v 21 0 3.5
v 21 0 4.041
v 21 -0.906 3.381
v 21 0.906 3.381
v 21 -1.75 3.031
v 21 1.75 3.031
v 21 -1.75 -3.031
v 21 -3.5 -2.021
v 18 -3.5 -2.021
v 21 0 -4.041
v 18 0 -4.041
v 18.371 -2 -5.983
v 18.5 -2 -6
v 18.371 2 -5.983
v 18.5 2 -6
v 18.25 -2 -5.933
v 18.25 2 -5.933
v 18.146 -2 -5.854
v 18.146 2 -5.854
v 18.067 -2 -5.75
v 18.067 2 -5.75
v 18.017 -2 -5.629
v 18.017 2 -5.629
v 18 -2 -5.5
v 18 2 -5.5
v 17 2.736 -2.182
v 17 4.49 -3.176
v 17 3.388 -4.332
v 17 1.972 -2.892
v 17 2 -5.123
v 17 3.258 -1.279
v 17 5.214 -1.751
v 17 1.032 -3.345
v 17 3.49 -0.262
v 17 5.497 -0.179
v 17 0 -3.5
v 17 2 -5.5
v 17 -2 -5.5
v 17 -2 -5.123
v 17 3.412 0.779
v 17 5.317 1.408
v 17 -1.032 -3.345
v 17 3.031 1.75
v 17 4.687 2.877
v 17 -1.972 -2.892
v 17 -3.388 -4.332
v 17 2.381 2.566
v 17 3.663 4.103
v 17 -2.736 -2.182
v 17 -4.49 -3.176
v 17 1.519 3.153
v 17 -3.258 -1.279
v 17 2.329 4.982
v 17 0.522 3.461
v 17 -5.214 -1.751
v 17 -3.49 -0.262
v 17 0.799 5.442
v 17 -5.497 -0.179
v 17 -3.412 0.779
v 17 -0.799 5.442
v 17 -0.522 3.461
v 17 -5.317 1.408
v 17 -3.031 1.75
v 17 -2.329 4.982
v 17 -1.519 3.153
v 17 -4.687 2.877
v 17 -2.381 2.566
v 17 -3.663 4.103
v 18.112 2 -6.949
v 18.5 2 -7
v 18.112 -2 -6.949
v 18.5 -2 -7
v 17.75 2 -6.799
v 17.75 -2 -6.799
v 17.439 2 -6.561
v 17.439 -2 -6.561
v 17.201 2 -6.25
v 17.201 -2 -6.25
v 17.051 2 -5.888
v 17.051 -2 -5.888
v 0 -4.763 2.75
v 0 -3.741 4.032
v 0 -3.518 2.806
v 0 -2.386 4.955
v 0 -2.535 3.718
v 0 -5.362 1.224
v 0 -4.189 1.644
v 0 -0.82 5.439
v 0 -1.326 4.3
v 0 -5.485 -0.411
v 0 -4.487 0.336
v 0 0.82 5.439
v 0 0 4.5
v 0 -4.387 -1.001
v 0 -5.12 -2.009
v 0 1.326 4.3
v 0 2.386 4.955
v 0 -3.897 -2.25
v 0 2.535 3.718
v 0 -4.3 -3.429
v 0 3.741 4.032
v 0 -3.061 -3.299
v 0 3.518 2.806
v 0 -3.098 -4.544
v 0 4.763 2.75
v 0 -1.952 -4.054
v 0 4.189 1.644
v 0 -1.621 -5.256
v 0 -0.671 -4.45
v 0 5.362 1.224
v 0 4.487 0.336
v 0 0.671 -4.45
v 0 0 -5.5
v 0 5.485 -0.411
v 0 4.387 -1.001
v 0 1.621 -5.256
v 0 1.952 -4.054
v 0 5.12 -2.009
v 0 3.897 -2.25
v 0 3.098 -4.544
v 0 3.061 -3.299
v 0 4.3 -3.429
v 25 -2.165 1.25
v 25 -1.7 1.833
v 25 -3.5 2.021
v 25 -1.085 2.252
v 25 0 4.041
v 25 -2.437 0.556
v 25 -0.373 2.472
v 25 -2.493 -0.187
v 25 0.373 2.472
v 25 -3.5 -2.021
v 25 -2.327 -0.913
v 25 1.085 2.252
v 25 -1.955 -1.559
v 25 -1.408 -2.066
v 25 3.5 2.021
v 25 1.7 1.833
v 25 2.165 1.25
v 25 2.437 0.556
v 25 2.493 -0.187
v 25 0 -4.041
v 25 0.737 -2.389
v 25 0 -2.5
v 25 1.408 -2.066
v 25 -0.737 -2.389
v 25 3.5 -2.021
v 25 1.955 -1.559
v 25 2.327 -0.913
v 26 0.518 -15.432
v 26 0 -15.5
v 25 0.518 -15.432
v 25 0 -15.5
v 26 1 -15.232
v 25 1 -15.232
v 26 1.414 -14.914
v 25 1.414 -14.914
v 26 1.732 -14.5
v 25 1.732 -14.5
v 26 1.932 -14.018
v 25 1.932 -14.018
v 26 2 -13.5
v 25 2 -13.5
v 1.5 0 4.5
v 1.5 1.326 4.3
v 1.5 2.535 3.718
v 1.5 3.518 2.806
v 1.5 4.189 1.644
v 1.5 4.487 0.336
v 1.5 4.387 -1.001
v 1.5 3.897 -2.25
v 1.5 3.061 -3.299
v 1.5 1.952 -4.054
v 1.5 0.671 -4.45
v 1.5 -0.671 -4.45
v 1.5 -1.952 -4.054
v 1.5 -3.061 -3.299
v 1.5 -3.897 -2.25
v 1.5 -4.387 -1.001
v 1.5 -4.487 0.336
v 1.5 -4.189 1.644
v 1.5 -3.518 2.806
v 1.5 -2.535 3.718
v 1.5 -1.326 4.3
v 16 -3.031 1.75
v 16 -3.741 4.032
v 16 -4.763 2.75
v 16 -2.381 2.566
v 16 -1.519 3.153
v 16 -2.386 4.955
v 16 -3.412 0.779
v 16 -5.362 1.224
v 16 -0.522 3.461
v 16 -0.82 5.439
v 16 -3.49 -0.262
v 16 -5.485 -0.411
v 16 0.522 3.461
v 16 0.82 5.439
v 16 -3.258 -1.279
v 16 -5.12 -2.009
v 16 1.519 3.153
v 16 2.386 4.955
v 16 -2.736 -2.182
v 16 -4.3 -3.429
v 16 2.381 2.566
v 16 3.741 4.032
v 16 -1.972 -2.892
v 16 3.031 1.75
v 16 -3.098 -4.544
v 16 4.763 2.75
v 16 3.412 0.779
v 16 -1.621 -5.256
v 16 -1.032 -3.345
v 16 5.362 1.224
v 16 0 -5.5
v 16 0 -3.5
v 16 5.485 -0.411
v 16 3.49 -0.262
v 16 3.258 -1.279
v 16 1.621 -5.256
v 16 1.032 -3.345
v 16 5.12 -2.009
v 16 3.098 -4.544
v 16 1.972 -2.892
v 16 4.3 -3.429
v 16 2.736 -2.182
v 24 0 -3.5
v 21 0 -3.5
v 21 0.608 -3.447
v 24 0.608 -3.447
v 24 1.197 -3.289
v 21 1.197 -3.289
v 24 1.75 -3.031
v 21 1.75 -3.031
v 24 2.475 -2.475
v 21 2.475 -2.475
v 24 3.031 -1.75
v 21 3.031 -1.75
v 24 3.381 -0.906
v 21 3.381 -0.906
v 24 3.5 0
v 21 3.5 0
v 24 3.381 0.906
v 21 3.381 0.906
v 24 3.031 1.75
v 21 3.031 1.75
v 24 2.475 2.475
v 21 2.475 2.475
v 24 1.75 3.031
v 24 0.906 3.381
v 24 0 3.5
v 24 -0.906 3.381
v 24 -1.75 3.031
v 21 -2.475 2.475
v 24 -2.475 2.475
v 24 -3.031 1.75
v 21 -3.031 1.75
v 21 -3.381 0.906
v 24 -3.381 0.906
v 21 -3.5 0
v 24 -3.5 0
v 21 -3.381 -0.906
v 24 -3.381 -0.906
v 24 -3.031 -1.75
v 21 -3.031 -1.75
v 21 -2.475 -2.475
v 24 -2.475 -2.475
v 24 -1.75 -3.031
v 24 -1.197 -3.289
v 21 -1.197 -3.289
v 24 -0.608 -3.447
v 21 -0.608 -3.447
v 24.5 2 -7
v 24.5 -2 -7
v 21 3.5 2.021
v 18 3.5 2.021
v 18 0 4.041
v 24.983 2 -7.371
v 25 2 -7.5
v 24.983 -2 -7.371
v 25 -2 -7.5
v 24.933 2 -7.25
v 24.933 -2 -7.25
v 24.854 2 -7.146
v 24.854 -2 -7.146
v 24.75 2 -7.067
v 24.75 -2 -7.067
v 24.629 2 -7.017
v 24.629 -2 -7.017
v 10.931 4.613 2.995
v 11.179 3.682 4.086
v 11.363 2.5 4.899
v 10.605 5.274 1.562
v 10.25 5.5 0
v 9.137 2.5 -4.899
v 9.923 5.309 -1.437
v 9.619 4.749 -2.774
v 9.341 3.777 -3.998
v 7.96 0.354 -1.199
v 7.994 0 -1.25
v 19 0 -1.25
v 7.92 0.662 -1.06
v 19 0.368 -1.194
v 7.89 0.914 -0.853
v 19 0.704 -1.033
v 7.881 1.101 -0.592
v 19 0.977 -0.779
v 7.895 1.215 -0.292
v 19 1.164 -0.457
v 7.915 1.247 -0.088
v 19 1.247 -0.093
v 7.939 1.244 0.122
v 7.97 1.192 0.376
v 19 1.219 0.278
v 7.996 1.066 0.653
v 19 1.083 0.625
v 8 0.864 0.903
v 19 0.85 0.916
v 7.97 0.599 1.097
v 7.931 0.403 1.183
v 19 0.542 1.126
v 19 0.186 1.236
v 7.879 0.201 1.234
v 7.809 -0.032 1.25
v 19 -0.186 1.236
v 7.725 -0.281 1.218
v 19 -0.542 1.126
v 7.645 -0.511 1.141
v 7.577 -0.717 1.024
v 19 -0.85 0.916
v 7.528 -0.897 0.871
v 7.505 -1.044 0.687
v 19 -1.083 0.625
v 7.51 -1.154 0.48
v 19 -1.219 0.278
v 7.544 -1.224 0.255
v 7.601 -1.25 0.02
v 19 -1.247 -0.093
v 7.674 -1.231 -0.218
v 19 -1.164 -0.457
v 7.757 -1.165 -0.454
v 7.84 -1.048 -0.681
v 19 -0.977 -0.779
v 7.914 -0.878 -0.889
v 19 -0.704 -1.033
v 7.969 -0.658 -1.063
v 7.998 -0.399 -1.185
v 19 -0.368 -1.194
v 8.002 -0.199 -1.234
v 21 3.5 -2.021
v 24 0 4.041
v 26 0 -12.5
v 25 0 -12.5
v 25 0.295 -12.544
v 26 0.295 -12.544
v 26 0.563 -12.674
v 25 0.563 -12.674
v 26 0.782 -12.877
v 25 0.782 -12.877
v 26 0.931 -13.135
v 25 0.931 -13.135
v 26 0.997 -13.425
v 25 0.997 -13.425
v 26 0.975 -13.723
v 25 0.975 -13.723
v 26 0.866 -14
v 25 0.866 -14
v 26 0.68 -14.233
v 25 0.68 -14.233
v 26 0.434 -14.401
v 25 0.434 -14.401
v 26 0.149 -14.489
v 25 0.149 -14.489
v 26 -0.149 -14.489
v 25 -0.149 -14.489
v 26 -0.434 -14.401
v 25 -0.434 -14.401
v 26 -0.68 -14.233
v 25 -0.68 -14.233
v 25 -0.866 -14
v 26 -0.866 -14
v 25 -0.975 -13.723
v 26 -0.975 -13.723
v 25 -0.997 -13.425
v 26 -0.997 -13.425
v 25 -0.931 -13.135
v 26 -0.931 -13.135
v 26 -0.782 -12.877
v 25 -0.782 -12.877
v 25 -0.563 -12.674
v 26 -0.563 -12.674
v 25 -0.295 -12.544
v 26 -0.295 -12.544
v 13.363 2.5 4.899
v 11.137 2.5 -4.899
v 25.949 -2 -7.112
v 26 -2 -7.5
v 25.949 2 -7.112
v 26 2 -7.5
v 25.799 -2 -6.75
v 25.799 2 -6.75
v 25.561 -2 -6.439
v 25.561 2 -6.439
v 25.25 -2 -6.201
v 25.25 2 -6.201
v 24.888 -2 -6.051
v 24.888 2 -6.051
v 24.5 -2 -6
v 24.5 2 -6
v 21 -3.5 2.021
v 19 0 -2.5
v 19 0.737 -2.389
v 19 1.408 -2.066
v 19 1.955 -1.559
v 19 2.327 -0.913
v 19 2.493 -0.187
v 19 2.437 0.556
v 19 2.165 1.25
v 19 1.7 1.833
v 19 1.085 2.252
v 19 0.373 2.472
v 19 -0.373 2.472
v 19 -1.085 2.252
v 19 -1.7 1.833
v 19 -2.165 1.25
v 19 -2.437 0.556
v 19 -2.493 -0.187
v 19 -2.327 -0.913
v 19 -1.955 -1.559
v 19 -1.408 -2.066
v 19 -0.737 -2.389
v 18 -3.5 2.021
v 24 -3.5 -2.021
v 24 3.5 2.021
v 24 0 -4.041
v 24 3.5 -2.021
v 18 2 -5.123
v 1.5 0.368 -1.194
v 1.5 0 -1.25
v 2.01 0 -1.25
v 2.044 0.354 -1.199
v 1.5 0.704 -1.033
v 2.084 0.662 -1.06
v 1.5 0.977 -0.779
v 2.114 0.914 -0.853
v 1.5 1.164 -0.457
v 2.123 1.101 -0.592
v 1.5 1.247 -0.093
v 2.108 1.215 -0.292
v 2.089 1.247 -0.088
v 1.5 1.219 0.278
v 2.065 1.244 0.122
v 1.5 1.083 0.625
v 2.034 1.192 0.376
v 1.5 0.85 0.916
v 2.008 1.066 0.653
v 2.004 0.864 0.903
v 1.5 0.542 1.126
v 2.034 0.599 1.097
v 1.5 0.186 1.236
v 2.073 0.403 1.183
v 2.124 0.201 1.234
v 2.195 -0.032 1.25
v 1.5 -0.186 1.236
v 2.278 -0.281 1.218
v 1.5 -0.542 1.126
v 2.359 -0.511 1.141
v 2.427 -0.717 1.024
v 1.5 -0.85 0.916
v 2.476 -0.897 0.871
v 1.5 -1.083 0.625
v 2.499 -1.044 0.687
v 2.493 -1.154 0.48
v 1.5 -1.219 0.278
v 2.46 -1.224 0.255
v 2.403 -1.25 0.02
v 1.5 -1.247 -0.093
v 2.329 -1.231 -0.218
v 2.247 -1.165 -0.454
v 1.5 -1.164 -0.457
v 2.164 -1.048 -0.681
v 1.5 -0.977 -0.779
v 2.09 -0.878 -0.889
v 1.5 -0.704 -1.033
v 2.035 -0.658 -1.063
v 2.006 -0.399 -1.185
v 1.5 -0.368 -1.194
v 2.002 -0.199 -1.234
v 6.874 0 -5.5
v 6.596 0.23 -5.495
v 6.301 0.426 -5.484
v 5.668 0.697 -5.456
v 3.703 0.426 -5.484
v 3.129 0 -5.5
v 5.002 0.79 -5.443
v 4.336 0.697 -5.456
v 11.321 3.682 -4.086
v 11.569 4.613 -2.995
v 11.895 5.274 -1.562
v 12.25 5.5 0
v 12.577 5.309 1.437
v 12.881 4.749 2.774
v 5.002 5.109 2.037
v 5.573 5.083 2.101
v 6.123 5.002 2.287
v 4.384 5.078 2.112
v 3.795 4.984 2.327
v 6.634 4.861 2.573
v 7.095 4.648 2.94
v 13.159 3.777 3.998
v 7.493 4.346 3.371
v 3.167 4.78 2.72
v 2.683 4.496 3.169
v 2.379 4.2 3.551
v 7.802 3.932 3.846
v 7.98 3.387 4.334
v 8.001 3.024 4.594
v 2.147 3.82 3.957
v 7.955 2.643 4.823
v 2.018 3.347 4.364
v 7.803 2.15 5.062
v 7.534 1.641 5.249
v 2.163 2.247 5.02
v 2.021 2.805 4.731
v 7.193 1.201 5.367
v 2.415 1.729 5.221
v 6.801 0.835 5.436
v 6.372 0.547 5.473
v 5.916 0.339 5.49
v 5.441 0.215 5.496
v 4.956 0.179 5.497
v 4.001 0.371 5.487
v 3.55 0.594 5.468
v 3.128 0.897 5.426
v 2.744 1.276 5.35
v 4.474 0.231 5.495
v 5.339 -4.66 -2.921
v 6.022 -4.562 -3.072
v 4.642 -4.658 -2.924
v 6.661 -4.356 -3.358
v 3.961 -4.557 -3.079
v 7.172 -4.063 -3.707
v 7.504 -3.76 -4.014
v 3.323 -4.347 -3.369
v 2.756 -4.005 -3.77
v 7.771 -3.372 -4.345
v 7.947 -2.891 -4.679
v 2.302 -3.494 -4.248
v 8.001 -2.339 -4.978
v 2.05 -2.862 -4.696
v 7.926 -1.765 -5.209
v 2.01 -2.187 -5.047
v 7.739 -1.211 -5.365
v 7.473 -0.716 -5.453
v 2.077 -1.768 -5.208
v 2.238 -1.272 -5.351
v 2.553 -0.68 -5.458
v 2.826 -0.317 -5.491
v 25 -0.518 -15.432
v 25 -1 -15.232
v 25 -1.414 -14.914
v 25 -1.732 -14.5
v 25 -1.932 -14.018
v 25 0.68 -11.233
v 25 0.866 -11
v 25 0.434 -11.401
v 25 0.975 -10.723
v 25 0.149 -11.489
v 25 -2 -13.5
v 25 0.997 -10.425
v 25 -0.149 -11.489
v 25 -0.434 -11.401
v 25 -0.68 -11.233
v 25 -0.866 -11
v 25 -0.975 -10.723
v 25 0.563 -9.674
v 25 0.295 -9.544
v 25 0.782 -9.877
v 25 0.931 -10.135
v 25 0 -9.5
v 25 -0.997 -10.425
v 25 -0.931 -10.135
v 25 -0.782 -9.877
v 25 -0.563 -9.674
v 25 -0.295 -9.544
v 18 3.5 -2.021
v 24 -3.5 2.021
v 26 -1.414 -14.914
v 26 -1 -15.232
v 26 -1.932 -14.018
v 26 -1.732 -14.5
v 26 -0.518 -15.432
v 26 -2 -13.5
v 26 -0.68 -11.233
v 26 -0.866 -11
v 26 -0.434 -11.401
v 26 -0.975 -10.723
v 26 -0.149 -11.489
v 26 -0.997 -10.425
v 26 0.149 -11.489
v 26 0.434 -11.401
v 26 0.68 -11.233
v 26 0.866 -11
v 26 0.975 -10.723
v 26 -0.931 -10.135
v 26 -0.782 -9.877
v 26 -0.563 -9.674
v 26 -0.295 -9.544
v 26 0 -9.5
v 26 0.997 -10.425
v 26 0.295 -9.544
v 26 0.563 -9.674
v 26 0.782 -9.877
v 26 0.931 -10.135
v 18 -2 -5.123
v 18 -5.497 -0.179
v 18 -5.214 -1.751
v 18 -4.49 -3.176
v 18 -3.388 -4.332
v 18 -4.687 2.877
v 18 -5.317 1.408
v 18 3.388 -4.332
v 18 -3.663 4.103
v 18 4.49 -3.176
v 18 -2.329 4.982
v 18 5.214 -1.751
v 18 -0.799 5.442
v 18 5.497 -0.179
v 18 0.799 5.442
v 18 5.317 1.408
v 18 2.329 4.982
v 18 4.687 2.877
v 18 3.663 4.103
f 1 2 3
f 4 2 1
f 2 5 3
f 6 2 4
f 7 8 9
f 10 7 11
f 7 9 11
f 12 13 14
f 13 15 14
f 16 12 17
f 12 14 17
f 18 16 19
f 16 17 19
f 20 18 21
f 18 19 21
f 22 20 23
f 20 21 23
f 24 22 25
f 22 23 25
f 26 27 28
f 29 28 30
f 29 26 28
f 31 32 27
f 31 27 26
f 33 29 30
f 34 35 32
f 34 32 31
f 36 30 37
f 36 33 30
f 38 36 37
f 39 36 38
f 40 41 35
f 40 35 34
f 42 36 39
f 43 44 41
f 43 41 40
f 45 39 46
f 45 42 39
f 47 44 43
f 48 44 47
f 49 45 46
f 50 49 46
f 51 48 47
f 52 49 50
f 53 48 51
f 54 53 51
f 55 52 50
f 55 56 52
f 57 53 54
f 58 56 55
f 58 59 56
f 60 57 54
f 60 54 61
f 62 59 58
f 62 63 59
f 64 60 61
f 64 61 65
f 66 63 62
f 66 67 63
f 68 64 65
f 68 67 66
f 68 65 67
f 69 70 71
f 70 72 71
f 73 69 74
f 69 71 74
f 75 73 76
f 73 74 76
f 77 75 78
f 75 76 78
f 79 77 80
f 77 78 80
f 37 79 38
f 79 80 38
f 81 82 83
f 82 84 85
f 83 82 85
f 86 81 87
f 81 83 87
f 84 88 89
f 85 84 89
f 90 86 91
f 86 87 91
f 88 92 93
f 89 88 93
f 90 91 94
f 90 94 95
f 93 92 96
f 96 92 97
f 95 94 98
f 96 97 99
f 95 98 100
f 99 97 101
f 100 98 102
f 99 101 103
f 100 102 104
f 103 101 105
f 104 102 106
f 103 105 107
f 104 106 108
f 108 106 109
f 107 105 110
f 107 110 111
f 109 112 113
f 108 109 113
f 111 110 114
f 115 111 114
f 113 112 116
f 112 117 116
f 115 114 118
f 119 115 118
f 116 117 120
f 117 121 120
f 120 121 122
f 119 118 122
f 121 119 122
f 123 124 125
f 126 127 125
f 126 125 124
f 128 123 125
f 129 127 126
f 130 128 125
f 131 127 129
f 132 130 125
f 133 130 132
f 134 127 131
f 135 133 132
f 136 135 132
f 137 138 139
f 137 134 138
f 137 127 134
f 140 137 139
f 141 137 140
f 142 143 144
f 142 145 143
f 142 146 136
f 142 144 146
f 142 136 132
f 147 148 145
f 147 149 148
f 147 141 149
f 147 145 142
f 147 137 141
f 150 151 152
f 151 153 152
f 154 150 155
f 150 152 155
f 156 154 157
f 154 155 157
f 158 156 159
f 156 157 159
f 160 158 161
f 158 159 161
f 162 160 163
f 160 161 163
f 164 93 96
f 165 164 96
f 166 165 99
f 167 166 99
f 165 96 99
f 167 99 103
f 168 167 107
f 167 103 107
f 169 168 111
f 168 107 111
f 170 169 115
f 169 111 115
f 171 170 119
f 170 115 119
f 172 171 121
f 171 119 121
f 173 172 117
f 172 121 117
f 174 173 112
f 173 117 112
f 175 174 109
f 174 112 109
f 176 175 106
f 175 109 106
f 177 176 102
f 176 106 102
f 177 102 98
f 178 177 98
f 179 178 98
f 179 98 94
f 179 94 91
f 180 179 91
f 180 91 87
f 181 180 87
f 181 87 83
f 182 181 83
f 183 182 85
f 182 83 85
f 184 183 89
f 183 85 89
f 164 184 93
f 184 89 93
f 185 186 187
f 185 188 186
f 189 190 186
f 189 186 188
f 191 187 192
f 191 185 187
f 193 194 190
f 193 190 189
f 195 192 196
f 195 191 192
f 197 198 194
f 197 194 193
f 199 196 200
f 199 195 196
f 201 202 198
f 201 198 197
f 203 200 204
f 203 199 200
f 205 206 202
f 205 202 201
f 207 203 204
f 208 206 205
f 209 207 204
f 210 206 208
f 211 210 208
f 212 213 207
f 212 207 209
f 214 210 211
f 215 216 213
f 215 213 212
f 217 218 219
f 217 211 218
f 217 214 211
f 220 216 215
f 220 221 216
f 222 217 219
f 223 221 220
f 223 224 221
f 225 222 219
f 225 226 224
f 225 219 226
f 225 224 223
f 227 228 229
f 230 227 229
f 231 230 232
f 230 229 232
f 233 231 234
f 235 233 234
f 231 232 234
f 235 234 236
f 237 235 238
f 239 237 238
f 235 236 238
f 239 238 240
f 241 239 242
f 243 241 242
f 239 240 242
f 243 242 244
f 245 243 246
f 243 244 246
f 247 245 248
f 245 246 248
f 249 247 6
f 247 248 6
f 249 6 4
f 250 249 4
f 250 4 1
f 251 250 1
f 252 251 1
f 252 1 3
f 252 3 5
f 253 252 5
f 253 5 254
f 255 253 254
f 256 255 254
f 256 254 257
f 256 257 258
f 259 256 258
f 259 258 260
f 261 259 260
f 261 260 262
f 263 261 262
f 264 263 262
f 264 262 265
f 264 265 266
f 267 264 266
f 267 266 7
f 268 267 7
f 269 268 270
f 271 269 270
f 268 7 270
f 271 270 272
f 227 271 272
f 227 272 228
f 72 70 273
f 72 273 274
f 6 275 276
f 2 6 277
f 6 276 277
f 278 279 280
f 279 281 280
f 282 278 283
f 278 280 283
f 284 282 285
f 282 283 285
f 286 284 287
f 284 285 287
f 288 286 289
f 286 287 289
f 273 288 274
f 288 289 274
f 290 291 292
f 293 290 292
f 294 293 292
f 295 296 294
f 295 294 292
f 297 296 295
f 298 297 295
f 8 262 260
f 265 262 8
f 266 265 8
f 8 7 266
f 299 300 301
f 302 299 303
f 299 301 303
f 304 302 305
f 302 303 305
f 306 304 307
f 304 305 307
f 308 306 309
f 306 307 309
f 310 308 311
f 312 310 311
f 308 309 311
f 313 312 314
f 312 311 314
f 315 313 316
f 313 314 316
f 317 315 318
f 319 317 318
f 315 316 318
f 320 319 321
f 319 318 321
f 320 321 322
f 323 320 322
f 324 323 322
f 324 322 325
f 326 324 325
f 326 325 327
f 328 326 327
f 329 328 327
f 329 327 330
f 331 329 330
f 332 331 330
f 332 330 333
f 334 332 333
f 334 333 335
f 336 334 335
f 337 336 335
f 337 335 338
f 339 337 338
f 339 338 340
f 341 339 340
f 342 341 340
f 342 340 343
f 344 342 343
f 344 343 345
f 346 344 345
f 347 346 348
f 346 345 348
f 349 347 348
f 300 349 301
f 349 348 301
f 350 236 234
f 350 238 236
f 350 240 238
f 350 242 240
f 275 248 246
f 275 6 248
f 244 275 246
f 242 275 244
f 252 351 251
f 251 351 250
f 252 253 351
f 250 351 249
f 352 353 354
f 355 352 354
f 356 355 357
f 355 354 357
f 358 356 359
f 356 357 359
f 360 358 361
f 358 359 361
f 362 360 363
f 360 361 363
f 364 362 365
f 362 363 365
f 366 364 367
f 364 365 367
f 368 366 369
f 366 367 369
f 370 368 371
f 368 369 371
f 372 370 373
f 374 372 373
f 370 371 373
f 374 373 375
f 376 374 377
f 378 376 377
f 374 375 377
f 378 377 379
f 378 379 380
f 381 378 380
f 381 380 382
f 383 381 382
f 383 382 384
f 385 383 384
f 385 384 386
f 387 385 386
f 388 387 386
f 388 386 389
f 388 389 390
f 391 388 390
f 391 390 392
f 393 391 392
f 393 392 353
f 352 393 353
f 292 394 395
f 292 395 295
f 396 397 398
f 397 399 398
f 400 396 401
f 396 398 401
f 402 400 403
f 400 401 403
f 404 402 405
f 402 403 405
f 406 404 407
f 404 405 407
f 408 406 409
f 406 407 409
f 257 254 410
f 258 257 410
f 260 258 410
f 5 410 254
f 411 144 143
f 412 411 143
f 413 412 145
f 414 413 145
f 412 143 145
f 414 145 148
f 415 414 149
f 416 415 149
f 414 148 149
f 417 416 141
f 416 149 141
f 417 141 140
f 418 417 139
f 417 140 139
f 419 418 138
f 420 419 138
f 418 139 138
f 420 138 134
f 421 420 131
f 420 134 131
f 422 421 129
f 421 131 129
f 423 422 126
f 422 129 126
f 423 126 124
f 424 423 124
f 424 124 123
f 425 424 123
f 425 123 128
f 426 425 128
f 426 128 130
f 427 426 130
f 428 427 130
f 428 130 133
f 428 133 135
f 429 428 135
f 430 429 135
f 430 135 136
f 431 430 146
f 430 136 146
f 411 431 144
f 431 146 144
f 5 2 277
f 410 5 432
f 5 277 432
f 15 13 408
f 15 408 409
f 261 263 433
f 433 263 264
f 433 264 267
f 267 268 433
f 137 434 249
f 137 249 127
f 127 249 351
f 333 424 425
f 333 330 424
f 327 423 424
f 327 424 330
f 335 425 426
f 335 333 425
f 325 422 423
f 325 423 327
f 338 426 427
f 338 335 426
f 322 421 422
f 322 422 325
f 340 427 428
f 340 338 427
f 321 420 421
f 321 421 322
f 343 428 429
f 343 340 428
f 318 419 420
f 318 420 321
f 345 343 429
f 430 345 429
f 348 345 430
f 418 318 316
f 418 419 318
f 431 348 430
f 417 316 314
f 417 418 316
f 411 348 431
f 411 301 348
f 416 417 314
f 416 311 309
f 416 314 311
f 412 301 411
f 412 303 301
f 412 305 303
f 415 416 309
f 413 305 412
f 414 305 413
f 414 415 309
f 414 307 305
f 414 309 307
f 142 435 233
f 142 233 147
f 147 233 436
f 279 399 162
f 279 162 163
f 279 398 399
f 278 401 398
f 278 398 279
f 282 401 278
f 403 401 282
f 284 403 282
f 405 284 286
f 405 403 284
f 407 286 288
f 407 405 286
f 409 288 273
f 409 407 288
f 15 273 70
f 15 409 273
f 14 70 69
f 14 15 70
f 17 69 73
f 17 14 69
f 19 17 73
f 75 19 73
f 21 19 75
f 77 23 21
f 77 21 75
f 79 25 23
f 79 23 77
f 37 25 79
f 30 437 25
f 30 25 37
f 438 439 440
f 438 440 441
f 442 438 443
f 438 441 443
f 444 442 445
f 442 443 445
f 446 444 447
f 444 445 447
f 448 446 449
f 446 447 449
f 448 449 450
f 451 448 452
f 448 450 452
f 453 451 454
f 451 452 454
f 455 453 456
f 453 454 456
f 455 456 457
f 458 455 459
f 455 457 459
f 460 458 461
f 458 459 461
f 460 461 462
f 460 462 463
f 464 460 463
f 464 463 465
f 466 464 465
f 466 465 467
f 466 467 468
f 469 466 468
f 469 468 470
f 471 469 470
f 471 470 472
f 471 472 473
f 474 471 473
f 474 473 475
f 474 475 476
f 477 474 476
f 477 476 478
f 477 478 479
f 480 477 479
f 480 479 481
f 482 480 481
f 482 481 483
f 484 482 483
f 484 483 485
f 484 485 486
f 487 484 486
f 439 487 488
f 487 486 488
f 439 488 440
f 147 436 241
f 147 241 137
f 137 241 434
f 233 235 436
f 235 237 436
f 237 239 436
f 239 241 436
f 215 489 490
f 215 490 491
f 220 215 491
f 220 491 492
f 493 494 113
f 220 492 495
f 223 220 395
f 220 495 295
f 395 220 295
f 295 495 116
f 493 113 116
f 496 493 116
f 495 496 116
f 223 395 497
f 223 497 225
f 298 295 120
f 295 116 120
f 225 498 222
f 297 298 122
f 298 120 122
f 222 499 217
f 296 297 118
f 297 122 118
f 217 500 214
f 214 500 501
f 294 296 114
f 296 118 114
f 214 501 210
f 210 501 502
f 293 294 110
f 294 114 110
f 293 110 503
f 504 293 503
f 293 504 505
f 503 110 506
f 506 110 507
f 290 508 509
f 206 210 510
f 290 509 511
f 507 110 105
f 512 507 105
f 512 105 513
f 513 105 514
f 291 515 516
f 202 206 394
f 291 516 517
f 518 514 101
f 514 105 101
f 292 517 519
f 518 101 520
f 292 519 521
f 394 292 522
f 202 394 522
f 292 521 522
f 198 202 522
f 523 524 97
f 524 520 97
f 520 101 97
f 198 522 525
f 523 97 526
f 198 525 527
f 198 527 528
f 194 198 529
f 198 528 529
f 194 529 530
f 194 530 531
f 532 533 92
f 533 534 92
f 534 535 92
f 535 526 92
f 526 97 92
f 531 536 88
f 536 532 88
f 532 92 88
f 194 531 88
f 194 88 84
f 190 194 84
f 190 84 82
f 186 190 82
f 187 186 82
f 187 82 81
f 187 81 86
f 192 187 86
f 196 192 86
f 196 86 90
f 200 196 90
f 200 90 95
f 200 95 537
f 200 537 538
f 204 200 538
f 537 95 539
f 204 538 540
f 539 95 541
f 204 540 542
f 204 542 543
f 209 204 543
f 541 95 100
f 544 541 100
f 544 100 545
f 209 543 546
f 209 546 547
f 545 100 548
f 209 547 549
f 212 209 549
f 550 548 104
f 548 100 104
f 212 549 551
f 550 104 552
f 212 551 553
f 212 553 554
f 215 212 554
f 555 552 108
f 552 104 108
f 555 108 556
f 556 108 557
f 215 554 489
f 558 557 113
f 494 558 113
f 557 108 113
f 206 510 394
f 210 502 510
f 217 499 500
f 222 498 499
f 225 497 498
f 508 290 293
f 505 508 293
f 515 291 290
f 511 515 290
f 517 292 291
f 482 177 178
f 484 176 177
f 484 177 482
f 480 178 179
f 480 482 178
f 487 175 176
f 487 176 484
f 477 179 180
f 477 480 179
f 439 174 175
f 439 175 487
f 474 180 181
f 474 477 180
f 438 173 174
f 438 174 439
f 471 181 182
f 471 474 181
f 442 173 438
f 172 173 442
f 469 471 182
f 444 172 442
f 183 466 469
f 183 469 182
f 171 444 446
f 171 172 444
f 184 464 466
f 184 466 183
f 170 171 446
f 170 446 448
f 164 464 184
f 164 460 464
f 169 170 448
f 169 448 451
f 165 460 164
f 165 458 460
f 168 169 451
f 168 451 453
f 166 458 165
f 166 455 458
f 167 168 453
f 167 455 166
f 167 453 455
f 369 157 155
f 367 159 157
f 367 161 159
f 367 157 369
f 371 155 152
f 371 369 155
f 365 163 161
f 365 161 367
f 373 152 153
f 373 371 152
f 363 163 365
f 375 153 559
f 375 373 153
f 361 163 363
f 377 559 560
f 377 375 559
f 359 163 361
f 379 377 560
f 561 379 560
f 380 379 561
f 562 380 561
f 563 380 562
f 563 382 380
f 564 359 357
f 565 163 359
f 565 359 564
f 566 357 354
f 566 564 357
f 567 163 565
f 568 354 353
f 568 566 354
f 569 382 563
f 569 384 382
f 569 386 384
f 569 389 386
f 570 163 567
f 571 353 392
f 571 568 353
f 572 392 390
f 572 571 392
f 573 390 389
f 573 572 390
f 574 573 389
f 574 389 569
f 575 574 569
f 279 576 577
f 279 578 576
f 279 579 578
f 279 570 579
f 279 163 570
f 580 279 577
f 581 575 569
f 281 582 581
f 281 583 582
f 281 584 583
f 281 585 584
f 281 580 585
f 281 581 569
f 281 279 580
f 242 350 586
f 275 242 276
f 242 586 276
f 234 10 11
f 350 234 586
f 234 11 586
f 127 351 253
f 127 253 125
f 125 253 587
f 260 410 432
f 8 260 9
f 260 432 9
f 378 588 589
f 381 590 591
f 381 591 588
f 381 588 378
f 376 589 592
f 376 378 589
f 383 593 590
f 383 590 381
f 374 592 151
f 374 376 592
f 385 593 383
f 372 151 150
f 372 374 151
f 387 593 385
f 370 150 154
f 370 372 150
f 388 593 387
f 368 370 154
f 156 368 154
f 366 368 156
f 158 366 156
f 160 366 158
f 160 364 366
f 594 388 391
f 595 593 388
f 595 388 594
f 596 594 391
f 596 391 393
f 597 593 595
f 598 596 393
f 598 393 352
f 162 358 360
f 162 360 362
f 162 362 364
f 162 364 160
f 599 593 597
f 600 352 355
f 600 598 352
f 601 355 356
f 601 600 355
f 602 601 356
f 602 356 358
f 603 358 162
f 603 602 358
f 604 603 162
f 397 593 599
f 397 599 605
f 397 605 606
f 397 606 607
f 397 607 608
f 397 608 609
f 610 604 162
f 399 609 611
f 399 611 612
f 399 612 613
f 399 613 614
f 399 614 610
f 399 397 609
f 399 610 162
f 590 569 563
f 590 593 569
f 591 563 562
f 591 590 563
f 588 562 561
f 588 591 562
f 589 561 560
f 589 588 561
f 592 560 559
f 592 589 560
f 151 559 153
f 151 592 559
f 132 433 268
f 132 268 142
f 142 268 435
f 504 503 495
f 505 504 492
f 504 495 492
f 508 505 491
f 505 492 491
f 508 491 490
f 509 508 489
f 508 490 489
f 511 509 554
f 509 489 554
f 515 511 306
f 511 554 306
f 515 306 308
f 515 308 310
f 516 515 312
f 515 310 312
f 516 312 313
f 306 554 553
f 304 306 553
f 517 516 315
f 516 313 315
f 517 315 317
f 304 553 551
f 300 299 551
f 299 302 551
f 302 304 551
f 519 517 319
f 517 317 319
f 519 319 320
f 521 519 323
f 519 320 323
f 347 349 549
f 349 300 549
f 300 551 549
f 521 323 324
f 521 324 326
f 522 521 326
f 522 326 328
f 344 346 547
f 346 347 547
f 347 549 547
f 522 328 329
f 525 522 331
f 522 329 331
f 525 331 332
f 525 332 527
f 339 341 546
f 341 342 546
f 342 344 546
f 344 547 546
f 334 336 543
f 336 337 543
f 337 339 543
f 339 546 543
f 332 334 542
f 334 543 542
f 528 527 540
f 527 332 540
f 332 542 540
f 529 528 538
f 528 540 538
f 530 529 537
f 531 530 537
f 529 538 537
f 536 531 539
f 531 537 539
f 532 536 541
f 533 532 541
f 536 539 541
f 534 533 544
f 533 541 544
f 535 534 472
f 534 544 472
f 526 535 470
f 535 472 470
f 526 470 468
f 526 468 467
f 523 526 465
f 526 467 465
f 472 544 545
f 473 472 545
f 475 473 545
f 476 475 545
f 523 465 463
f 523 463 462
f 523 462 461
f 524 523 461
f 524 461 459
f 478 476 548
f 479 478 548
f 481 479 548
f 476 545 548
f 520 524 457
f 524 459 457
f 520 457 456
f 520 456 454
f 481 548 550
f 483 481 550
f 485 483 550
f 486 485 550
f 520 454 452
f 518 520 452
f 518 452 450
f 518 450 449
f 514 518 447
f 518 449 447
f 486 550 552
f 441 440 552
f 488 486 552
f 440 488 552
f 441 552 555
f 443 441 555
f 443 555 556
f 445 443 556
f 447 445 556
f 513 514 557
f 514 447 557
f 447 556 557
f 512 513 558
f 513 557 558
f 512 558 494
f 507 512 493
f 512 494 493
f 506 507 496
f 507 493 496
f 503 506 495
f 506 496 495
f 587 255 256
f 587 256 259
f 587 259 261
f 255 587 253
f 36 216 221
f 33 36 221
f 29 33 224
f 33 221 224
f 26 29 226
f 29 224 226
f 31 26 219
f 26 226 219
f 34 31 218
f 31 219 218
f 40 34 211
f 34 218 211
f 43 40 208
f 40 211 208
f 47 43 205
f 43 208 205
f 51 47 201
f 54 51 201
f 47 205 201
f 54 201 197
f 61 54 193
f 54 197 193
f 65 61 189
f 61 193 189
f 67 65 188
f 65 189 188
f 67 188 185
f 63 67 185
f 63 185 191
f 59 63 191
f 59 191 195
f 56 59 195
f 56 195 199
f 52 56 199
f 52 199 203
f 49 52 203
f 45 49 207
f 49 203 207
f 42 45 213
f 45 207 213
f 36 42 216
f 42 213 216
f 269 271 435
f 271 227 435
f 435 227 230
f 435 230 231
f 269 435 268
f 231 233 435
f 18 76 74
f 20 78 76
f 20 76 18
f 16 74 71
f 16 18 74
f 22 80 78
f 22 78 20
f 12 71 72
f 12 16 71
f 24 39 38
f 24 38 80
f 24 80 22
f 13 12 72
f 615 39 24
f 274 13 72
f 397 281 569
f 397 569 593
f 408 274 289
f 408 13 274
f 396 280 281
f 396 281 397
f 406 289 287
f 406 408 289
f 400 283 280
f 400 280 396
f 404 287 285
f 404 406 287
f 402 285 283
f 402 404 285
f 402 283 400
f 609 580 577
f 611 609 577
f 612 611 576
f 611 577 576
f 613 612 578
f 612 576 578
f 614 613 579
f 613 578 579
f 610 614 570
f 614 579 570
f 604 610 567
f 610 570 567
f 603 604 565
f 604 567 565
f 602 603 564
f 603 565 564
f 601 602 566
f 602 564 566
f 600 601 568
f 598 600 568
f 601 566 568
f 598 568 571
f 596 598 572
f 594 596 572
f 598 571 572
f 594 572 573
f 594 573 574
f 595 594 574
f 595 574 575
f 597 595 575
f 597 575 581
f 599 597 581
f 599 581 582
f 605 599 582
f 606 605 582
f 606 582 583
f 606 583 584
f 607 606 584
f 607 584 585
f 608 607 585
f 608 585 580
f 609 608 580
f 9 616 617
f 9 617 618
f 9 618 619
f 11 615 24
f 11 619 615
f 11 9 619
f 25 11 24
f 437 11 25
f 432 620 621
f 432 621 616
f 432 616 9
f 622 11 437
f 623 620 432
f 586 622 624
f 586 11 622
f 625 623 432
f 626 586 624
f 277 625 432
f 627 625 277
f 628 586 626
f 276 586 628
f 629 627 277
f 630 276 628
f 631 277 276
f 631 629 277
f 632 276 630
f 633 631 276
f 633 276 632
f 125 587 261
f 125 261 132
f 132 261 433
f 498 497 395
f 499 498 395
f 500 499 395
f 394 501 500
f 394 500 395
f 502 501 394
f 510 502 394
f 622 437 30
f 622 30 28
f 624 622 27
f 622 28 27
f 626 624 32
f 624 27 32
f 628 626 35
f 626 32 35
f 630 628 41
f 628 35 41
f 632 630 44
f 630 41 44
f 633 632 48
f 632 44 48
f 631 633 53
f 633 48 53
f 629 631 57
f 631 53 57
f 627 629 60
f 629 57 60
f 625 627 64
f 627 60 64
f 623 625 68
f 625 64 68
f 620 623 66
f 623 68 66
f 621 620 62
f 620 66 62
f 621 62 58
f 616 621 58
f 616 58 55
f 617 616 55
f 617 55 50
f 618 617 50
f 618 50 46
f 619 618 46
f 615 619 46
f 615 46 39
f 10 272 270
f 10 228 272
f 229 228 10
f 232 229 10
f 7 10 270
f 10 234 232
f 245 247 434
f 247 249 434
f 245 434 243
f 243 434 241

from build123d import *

# Parameters (mm, degrees)
SKETCH1_R           = 5.5
BOSS_EXTRUDE1_DEPTH = 16
SKETCH2_R           = 3.5
BOSS_EXTRUDE2_DEPTH = 1
SKETCH3_R           = 5.5
BOSS_EXTRUDE3_DEPTH = 1
SKETCH5_W           = 1
SKETCH5_H           = 4
FILLET1_R           = 2
BOSS_EXTRUDE4_DEPTH = 3
SKETCH8_R           = 3.5
BOSS_EXTRUDE5_DEPTH = 3
BOSS_EXTRUDE7_DEPTH = 1
SKETCH17_R          = 2.5
CUT_EXTRUDE7_DEPTH  = 6
SKETCH18_R          = 1.25
CUT_EXTRUDE8_DEPTH  = 26.129663746
SKETCH19_R          = 4.5
CUT_EXTRUDE9_DEPTH  = 1.5
SKETCH21_R          = 3
CUT_EXTRUDE10_DEPTH = 30.314547048
CUT_EXTRUDE12_DEPTH = 3
SKETCH24_R          = 1
CUT_EXTRUDE13_DEPTH = 3


with BuildPart() as part:
    # Sketch1 → Boss-Extrude1 (new body)
    with BuildSketch(Plane(origin=(0, 0, 0), x_dir=(0, 0, -1), z_dir=(1, 0, 0))):
        Circle(SKETCH1_R)
    extrude(amount=BOSS_EXTRUDE1_DEPTH)

    # Sketch2 → Boss-Extrude2 (add)
    with BuildSketch(Plane(origin=(16, 0, 0), x_dir=(0, 0, -1), z_dir=(1, 0, 0))):
        Circle(SKETCH2_R)
    extrude(amount=BOSS_EXTRUDE2_DEPTH)

    # Sketch3 → Boss-Extrude3 (add)
    with BuildSketch(Plane(origin=(17, 0, 0), x_dir=(0, 0, -1), z_dir=(1, 0, 0))):
        Circle(SKETCH3_R)
    extrude(amount=BOSS_EXTRUDE3_DEPTH)

    # Sweep1: sweep along a path in Sketch4
    with BuildLine(Plane(origin=(0, 0, 0), x_dir=(1, 0, 0), z_dir=(0, 1, 0))) as sweep1_path:
        Line((25.5, 15.5), (25.5, 7.5))
        ThreePointArc((25.5, 7.5), (25.207106781, 6.792893219), (24.5, 6.5))
        Line((24.5, 6.5), (18.5, 6.5))
        ThreePointArc((18.5, 6.5), (17.792893219, 6.207106781), (17.5, 5.5))
        Line((17.5, 5.5), (17.5, 4.331461844))
    # Sketch5 → Sweep1 (sweep)
    with BuildSketch(Plane.XY.offset(-15.5)):
        with Locations((25.5, 0)):
            Rectangle(SKETCH5_W, SKETCH5_H)
    sweep(path=sweep1_path.line)

    # Fillet1
    fillet1_edges = [part.edges().sort_by_distance(p)[0] for p in [
        (25.5, -2, -15.5),
        (25.5, 2, -15.5),
    ]]
    fillet(fillet1_edges, radius=FILLET1_R - 0.0001)  # a hair under: the kernel refuses the full size

    # Sketch7 → Boss-Extrude4 (add)
    with BuildSketch(Plane(origin=(18, 0, 0), x_dir=(0, 0, -1), z_dir=(1, 0, 0))):
        Polygon((-2.020725942, -3.5), (2.020725942, -3.5), (4.041451884, 0), (2.020725942, 3.5), (-2.020725942, 3.5), (-4.041451884, 0), align=None)
    extrude(amount=BOSS_EXTRUDE4_DEPTH)

    # Sketch8 → Boss-Extrude5 (add)
    with BuildSketch(Plane(origin=(21, 0, 0), x_dir=(0, 0, -1), z_dir=(1, 0, 0))):
        Circle(SKETCH8_R)
    extrude(amount=BOSS_EXTRUDE5_DEPTH)

    # Sketch9 → Boss-Extrude7 (add)
    with BuildSketch(Plane(origin=(24, 0, 0), x_dir=(0, 0, -1), z_dir=(1, 0, 0))):
        Polygon((-2.020725942, -3.5), (2.020725942, -3.5), (4.041451884, 0), (2.020725942, 3.5), (-2.020725942, 3.5), (-4.041451884, 0), align=None)
    extrude(amount=BOSS_EXTRUDE7_DEPTH)

    # Sketch17 → Cut-Extrude7 (cut)
    with BuildSketch(Plane(origin=(25, 0, 0), x_dir=(0, 0, -1), z_dir=(1, 0, 0))):
        Circle(SKETCH17_R)
    extrude(amount=-CUT_EXTRUDE7_DEPTH, mode=Mode.SUBTRACT)

    # Sketch18 → Cut-Extrude8 (cut, through all)
    with BuildSketch(Plane(origin=(19, 0, 0), x_dir=(0, 0, -1), z_dir=(1, 0, 0))):
        Circle(SKETCH18_R)
    extrude(amount=-CUT_EXTRUDE8_DEPTH, mode=Mode.SUBTRACT)

    # Sketch19 → Cut-Extrude9 (cut)
    with BuildSketch(Plane.ZY):
        Circle(SKETCH19_R)
    extrude(amount=-CUT_EXTRUDE9_DEPTH, mode=Mode.SUBTRACT)

    # Sketch21 → Cut-Extrude10 (cut, through all)
    with BuildSketch(Plane(origin=(0, -2.75, -4.763139721), x_dir=(-1, 0, 0), z_dir=(0, -0.5000000000000002, -0.8660254037844385))):
        with Locations(Location((-5.001832393, 0.406031974, 0), (0, 0, 90))):
            Circle(SKETCH21_R)
    extrude(amount=-CUT_EXTRUDE10_DEPTH, mode=Mode.SUBTRACT)

    # Sketch23 → Cut-Extrude12 (cut)
    with BuildSketch(Plane(origin=(0, 5.5, 0), x_dir=(1, 0, 0), z_dir=(0, 1, 0))):
        Polygon((11, 5.5), (13.5, -5.5), (11.5, -5.5), (9, 5.5), align=None)
    extrude(amount=-CUT_EXTRUDE12_DEPTH, mode=Mode.SUBTRACT)

    # Sketch24 → Cut-Extrude13 (cut)
    with BuildSketch(Plane.ZY.offset(-25)):
        with Locations((-13.5, 0)):
            Circle(SKETCH24_R)
        with Locations((-10.5, 0)):
            Circle(SKETCH24_R)
    extrude(amount=-CUT_EXTRUDE13_DEPTH, mode=Mode.SUBTRACT)


solid = part.part
